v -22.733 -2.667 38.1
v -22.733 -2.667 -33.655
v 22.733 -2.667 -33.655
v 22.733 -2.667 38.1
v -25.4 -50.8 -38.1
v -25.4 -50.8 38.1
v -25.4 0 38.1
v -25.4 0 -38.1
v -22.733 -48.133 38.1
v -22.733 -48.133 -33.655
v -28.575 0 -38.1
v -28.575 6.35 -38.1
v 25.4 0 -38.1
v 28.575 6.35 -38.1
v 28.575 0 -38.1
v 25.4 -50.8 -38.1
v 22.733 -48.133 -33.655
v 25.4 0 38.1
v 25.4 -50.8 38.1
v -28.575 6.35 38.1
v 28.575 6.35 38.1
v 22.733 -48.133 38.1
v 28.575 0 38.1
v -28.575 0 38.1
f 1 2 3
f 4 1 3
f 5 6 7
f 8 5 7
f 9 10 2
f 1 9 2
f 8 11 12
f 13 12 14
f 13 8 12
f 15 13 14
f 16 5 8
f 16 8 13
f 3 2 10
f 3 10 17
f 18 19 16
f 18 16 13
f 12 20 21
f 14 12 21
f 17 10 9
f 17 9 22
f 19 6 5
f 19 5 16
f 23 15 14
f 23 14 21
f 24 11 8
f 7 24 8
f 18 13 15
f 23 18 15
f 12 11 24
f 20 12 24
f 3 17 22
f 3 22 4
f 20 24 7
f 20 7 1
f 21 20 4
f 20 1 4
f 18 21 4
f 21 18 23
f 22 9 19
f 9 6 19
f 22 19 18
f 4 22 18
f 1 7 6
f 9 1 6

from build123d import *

# Parameters (mm, degrees)
F0_W     = 57.15
F0_H     = 76.2
F2_DEPTH = 6.35
F1_W     = 50.8
F1_H     = 50.8
F1_W_2   = 45.466
F1_H_2   = 45.466
F3_DEPTH = 38.1
F4_START = -33.655
F4_DEPTH = 4.445


# Not quite as in the source:
# - a feature names something its author has since deleted; it is built from what else it names


with BuildPart() as f2:
    # F0 (on Front) → F2 (new body)
    with BuildSketch(Plane.XZ):
        Rectangle(F0_W, F0_H)
    extrude(amount=-F2_DEPTH)

    # F1 (on Top) → F3 (join, symmetric)
    with BuildSketch(Plane.XY):
        with Locations((0, -25.4)):
            Rectangle(F1_W, F1_H)
        with Locations((0, -25.4)):
            Rectangle(F1_W_2, F1_H_2, mode=Mode.SUBTRACT)
    extrude(amount=F3_DEPTH, both=True)

    # F1 (on Top) → F4 (join)
    with BuildSketch(Plane.XY.offset(F4_START)):
        with Locations((0, -25.4)):
            Rectangle(F1_W_2, F1_H_2)
    extrude(amount=-F4_DEPTH)


solid = f2.part
